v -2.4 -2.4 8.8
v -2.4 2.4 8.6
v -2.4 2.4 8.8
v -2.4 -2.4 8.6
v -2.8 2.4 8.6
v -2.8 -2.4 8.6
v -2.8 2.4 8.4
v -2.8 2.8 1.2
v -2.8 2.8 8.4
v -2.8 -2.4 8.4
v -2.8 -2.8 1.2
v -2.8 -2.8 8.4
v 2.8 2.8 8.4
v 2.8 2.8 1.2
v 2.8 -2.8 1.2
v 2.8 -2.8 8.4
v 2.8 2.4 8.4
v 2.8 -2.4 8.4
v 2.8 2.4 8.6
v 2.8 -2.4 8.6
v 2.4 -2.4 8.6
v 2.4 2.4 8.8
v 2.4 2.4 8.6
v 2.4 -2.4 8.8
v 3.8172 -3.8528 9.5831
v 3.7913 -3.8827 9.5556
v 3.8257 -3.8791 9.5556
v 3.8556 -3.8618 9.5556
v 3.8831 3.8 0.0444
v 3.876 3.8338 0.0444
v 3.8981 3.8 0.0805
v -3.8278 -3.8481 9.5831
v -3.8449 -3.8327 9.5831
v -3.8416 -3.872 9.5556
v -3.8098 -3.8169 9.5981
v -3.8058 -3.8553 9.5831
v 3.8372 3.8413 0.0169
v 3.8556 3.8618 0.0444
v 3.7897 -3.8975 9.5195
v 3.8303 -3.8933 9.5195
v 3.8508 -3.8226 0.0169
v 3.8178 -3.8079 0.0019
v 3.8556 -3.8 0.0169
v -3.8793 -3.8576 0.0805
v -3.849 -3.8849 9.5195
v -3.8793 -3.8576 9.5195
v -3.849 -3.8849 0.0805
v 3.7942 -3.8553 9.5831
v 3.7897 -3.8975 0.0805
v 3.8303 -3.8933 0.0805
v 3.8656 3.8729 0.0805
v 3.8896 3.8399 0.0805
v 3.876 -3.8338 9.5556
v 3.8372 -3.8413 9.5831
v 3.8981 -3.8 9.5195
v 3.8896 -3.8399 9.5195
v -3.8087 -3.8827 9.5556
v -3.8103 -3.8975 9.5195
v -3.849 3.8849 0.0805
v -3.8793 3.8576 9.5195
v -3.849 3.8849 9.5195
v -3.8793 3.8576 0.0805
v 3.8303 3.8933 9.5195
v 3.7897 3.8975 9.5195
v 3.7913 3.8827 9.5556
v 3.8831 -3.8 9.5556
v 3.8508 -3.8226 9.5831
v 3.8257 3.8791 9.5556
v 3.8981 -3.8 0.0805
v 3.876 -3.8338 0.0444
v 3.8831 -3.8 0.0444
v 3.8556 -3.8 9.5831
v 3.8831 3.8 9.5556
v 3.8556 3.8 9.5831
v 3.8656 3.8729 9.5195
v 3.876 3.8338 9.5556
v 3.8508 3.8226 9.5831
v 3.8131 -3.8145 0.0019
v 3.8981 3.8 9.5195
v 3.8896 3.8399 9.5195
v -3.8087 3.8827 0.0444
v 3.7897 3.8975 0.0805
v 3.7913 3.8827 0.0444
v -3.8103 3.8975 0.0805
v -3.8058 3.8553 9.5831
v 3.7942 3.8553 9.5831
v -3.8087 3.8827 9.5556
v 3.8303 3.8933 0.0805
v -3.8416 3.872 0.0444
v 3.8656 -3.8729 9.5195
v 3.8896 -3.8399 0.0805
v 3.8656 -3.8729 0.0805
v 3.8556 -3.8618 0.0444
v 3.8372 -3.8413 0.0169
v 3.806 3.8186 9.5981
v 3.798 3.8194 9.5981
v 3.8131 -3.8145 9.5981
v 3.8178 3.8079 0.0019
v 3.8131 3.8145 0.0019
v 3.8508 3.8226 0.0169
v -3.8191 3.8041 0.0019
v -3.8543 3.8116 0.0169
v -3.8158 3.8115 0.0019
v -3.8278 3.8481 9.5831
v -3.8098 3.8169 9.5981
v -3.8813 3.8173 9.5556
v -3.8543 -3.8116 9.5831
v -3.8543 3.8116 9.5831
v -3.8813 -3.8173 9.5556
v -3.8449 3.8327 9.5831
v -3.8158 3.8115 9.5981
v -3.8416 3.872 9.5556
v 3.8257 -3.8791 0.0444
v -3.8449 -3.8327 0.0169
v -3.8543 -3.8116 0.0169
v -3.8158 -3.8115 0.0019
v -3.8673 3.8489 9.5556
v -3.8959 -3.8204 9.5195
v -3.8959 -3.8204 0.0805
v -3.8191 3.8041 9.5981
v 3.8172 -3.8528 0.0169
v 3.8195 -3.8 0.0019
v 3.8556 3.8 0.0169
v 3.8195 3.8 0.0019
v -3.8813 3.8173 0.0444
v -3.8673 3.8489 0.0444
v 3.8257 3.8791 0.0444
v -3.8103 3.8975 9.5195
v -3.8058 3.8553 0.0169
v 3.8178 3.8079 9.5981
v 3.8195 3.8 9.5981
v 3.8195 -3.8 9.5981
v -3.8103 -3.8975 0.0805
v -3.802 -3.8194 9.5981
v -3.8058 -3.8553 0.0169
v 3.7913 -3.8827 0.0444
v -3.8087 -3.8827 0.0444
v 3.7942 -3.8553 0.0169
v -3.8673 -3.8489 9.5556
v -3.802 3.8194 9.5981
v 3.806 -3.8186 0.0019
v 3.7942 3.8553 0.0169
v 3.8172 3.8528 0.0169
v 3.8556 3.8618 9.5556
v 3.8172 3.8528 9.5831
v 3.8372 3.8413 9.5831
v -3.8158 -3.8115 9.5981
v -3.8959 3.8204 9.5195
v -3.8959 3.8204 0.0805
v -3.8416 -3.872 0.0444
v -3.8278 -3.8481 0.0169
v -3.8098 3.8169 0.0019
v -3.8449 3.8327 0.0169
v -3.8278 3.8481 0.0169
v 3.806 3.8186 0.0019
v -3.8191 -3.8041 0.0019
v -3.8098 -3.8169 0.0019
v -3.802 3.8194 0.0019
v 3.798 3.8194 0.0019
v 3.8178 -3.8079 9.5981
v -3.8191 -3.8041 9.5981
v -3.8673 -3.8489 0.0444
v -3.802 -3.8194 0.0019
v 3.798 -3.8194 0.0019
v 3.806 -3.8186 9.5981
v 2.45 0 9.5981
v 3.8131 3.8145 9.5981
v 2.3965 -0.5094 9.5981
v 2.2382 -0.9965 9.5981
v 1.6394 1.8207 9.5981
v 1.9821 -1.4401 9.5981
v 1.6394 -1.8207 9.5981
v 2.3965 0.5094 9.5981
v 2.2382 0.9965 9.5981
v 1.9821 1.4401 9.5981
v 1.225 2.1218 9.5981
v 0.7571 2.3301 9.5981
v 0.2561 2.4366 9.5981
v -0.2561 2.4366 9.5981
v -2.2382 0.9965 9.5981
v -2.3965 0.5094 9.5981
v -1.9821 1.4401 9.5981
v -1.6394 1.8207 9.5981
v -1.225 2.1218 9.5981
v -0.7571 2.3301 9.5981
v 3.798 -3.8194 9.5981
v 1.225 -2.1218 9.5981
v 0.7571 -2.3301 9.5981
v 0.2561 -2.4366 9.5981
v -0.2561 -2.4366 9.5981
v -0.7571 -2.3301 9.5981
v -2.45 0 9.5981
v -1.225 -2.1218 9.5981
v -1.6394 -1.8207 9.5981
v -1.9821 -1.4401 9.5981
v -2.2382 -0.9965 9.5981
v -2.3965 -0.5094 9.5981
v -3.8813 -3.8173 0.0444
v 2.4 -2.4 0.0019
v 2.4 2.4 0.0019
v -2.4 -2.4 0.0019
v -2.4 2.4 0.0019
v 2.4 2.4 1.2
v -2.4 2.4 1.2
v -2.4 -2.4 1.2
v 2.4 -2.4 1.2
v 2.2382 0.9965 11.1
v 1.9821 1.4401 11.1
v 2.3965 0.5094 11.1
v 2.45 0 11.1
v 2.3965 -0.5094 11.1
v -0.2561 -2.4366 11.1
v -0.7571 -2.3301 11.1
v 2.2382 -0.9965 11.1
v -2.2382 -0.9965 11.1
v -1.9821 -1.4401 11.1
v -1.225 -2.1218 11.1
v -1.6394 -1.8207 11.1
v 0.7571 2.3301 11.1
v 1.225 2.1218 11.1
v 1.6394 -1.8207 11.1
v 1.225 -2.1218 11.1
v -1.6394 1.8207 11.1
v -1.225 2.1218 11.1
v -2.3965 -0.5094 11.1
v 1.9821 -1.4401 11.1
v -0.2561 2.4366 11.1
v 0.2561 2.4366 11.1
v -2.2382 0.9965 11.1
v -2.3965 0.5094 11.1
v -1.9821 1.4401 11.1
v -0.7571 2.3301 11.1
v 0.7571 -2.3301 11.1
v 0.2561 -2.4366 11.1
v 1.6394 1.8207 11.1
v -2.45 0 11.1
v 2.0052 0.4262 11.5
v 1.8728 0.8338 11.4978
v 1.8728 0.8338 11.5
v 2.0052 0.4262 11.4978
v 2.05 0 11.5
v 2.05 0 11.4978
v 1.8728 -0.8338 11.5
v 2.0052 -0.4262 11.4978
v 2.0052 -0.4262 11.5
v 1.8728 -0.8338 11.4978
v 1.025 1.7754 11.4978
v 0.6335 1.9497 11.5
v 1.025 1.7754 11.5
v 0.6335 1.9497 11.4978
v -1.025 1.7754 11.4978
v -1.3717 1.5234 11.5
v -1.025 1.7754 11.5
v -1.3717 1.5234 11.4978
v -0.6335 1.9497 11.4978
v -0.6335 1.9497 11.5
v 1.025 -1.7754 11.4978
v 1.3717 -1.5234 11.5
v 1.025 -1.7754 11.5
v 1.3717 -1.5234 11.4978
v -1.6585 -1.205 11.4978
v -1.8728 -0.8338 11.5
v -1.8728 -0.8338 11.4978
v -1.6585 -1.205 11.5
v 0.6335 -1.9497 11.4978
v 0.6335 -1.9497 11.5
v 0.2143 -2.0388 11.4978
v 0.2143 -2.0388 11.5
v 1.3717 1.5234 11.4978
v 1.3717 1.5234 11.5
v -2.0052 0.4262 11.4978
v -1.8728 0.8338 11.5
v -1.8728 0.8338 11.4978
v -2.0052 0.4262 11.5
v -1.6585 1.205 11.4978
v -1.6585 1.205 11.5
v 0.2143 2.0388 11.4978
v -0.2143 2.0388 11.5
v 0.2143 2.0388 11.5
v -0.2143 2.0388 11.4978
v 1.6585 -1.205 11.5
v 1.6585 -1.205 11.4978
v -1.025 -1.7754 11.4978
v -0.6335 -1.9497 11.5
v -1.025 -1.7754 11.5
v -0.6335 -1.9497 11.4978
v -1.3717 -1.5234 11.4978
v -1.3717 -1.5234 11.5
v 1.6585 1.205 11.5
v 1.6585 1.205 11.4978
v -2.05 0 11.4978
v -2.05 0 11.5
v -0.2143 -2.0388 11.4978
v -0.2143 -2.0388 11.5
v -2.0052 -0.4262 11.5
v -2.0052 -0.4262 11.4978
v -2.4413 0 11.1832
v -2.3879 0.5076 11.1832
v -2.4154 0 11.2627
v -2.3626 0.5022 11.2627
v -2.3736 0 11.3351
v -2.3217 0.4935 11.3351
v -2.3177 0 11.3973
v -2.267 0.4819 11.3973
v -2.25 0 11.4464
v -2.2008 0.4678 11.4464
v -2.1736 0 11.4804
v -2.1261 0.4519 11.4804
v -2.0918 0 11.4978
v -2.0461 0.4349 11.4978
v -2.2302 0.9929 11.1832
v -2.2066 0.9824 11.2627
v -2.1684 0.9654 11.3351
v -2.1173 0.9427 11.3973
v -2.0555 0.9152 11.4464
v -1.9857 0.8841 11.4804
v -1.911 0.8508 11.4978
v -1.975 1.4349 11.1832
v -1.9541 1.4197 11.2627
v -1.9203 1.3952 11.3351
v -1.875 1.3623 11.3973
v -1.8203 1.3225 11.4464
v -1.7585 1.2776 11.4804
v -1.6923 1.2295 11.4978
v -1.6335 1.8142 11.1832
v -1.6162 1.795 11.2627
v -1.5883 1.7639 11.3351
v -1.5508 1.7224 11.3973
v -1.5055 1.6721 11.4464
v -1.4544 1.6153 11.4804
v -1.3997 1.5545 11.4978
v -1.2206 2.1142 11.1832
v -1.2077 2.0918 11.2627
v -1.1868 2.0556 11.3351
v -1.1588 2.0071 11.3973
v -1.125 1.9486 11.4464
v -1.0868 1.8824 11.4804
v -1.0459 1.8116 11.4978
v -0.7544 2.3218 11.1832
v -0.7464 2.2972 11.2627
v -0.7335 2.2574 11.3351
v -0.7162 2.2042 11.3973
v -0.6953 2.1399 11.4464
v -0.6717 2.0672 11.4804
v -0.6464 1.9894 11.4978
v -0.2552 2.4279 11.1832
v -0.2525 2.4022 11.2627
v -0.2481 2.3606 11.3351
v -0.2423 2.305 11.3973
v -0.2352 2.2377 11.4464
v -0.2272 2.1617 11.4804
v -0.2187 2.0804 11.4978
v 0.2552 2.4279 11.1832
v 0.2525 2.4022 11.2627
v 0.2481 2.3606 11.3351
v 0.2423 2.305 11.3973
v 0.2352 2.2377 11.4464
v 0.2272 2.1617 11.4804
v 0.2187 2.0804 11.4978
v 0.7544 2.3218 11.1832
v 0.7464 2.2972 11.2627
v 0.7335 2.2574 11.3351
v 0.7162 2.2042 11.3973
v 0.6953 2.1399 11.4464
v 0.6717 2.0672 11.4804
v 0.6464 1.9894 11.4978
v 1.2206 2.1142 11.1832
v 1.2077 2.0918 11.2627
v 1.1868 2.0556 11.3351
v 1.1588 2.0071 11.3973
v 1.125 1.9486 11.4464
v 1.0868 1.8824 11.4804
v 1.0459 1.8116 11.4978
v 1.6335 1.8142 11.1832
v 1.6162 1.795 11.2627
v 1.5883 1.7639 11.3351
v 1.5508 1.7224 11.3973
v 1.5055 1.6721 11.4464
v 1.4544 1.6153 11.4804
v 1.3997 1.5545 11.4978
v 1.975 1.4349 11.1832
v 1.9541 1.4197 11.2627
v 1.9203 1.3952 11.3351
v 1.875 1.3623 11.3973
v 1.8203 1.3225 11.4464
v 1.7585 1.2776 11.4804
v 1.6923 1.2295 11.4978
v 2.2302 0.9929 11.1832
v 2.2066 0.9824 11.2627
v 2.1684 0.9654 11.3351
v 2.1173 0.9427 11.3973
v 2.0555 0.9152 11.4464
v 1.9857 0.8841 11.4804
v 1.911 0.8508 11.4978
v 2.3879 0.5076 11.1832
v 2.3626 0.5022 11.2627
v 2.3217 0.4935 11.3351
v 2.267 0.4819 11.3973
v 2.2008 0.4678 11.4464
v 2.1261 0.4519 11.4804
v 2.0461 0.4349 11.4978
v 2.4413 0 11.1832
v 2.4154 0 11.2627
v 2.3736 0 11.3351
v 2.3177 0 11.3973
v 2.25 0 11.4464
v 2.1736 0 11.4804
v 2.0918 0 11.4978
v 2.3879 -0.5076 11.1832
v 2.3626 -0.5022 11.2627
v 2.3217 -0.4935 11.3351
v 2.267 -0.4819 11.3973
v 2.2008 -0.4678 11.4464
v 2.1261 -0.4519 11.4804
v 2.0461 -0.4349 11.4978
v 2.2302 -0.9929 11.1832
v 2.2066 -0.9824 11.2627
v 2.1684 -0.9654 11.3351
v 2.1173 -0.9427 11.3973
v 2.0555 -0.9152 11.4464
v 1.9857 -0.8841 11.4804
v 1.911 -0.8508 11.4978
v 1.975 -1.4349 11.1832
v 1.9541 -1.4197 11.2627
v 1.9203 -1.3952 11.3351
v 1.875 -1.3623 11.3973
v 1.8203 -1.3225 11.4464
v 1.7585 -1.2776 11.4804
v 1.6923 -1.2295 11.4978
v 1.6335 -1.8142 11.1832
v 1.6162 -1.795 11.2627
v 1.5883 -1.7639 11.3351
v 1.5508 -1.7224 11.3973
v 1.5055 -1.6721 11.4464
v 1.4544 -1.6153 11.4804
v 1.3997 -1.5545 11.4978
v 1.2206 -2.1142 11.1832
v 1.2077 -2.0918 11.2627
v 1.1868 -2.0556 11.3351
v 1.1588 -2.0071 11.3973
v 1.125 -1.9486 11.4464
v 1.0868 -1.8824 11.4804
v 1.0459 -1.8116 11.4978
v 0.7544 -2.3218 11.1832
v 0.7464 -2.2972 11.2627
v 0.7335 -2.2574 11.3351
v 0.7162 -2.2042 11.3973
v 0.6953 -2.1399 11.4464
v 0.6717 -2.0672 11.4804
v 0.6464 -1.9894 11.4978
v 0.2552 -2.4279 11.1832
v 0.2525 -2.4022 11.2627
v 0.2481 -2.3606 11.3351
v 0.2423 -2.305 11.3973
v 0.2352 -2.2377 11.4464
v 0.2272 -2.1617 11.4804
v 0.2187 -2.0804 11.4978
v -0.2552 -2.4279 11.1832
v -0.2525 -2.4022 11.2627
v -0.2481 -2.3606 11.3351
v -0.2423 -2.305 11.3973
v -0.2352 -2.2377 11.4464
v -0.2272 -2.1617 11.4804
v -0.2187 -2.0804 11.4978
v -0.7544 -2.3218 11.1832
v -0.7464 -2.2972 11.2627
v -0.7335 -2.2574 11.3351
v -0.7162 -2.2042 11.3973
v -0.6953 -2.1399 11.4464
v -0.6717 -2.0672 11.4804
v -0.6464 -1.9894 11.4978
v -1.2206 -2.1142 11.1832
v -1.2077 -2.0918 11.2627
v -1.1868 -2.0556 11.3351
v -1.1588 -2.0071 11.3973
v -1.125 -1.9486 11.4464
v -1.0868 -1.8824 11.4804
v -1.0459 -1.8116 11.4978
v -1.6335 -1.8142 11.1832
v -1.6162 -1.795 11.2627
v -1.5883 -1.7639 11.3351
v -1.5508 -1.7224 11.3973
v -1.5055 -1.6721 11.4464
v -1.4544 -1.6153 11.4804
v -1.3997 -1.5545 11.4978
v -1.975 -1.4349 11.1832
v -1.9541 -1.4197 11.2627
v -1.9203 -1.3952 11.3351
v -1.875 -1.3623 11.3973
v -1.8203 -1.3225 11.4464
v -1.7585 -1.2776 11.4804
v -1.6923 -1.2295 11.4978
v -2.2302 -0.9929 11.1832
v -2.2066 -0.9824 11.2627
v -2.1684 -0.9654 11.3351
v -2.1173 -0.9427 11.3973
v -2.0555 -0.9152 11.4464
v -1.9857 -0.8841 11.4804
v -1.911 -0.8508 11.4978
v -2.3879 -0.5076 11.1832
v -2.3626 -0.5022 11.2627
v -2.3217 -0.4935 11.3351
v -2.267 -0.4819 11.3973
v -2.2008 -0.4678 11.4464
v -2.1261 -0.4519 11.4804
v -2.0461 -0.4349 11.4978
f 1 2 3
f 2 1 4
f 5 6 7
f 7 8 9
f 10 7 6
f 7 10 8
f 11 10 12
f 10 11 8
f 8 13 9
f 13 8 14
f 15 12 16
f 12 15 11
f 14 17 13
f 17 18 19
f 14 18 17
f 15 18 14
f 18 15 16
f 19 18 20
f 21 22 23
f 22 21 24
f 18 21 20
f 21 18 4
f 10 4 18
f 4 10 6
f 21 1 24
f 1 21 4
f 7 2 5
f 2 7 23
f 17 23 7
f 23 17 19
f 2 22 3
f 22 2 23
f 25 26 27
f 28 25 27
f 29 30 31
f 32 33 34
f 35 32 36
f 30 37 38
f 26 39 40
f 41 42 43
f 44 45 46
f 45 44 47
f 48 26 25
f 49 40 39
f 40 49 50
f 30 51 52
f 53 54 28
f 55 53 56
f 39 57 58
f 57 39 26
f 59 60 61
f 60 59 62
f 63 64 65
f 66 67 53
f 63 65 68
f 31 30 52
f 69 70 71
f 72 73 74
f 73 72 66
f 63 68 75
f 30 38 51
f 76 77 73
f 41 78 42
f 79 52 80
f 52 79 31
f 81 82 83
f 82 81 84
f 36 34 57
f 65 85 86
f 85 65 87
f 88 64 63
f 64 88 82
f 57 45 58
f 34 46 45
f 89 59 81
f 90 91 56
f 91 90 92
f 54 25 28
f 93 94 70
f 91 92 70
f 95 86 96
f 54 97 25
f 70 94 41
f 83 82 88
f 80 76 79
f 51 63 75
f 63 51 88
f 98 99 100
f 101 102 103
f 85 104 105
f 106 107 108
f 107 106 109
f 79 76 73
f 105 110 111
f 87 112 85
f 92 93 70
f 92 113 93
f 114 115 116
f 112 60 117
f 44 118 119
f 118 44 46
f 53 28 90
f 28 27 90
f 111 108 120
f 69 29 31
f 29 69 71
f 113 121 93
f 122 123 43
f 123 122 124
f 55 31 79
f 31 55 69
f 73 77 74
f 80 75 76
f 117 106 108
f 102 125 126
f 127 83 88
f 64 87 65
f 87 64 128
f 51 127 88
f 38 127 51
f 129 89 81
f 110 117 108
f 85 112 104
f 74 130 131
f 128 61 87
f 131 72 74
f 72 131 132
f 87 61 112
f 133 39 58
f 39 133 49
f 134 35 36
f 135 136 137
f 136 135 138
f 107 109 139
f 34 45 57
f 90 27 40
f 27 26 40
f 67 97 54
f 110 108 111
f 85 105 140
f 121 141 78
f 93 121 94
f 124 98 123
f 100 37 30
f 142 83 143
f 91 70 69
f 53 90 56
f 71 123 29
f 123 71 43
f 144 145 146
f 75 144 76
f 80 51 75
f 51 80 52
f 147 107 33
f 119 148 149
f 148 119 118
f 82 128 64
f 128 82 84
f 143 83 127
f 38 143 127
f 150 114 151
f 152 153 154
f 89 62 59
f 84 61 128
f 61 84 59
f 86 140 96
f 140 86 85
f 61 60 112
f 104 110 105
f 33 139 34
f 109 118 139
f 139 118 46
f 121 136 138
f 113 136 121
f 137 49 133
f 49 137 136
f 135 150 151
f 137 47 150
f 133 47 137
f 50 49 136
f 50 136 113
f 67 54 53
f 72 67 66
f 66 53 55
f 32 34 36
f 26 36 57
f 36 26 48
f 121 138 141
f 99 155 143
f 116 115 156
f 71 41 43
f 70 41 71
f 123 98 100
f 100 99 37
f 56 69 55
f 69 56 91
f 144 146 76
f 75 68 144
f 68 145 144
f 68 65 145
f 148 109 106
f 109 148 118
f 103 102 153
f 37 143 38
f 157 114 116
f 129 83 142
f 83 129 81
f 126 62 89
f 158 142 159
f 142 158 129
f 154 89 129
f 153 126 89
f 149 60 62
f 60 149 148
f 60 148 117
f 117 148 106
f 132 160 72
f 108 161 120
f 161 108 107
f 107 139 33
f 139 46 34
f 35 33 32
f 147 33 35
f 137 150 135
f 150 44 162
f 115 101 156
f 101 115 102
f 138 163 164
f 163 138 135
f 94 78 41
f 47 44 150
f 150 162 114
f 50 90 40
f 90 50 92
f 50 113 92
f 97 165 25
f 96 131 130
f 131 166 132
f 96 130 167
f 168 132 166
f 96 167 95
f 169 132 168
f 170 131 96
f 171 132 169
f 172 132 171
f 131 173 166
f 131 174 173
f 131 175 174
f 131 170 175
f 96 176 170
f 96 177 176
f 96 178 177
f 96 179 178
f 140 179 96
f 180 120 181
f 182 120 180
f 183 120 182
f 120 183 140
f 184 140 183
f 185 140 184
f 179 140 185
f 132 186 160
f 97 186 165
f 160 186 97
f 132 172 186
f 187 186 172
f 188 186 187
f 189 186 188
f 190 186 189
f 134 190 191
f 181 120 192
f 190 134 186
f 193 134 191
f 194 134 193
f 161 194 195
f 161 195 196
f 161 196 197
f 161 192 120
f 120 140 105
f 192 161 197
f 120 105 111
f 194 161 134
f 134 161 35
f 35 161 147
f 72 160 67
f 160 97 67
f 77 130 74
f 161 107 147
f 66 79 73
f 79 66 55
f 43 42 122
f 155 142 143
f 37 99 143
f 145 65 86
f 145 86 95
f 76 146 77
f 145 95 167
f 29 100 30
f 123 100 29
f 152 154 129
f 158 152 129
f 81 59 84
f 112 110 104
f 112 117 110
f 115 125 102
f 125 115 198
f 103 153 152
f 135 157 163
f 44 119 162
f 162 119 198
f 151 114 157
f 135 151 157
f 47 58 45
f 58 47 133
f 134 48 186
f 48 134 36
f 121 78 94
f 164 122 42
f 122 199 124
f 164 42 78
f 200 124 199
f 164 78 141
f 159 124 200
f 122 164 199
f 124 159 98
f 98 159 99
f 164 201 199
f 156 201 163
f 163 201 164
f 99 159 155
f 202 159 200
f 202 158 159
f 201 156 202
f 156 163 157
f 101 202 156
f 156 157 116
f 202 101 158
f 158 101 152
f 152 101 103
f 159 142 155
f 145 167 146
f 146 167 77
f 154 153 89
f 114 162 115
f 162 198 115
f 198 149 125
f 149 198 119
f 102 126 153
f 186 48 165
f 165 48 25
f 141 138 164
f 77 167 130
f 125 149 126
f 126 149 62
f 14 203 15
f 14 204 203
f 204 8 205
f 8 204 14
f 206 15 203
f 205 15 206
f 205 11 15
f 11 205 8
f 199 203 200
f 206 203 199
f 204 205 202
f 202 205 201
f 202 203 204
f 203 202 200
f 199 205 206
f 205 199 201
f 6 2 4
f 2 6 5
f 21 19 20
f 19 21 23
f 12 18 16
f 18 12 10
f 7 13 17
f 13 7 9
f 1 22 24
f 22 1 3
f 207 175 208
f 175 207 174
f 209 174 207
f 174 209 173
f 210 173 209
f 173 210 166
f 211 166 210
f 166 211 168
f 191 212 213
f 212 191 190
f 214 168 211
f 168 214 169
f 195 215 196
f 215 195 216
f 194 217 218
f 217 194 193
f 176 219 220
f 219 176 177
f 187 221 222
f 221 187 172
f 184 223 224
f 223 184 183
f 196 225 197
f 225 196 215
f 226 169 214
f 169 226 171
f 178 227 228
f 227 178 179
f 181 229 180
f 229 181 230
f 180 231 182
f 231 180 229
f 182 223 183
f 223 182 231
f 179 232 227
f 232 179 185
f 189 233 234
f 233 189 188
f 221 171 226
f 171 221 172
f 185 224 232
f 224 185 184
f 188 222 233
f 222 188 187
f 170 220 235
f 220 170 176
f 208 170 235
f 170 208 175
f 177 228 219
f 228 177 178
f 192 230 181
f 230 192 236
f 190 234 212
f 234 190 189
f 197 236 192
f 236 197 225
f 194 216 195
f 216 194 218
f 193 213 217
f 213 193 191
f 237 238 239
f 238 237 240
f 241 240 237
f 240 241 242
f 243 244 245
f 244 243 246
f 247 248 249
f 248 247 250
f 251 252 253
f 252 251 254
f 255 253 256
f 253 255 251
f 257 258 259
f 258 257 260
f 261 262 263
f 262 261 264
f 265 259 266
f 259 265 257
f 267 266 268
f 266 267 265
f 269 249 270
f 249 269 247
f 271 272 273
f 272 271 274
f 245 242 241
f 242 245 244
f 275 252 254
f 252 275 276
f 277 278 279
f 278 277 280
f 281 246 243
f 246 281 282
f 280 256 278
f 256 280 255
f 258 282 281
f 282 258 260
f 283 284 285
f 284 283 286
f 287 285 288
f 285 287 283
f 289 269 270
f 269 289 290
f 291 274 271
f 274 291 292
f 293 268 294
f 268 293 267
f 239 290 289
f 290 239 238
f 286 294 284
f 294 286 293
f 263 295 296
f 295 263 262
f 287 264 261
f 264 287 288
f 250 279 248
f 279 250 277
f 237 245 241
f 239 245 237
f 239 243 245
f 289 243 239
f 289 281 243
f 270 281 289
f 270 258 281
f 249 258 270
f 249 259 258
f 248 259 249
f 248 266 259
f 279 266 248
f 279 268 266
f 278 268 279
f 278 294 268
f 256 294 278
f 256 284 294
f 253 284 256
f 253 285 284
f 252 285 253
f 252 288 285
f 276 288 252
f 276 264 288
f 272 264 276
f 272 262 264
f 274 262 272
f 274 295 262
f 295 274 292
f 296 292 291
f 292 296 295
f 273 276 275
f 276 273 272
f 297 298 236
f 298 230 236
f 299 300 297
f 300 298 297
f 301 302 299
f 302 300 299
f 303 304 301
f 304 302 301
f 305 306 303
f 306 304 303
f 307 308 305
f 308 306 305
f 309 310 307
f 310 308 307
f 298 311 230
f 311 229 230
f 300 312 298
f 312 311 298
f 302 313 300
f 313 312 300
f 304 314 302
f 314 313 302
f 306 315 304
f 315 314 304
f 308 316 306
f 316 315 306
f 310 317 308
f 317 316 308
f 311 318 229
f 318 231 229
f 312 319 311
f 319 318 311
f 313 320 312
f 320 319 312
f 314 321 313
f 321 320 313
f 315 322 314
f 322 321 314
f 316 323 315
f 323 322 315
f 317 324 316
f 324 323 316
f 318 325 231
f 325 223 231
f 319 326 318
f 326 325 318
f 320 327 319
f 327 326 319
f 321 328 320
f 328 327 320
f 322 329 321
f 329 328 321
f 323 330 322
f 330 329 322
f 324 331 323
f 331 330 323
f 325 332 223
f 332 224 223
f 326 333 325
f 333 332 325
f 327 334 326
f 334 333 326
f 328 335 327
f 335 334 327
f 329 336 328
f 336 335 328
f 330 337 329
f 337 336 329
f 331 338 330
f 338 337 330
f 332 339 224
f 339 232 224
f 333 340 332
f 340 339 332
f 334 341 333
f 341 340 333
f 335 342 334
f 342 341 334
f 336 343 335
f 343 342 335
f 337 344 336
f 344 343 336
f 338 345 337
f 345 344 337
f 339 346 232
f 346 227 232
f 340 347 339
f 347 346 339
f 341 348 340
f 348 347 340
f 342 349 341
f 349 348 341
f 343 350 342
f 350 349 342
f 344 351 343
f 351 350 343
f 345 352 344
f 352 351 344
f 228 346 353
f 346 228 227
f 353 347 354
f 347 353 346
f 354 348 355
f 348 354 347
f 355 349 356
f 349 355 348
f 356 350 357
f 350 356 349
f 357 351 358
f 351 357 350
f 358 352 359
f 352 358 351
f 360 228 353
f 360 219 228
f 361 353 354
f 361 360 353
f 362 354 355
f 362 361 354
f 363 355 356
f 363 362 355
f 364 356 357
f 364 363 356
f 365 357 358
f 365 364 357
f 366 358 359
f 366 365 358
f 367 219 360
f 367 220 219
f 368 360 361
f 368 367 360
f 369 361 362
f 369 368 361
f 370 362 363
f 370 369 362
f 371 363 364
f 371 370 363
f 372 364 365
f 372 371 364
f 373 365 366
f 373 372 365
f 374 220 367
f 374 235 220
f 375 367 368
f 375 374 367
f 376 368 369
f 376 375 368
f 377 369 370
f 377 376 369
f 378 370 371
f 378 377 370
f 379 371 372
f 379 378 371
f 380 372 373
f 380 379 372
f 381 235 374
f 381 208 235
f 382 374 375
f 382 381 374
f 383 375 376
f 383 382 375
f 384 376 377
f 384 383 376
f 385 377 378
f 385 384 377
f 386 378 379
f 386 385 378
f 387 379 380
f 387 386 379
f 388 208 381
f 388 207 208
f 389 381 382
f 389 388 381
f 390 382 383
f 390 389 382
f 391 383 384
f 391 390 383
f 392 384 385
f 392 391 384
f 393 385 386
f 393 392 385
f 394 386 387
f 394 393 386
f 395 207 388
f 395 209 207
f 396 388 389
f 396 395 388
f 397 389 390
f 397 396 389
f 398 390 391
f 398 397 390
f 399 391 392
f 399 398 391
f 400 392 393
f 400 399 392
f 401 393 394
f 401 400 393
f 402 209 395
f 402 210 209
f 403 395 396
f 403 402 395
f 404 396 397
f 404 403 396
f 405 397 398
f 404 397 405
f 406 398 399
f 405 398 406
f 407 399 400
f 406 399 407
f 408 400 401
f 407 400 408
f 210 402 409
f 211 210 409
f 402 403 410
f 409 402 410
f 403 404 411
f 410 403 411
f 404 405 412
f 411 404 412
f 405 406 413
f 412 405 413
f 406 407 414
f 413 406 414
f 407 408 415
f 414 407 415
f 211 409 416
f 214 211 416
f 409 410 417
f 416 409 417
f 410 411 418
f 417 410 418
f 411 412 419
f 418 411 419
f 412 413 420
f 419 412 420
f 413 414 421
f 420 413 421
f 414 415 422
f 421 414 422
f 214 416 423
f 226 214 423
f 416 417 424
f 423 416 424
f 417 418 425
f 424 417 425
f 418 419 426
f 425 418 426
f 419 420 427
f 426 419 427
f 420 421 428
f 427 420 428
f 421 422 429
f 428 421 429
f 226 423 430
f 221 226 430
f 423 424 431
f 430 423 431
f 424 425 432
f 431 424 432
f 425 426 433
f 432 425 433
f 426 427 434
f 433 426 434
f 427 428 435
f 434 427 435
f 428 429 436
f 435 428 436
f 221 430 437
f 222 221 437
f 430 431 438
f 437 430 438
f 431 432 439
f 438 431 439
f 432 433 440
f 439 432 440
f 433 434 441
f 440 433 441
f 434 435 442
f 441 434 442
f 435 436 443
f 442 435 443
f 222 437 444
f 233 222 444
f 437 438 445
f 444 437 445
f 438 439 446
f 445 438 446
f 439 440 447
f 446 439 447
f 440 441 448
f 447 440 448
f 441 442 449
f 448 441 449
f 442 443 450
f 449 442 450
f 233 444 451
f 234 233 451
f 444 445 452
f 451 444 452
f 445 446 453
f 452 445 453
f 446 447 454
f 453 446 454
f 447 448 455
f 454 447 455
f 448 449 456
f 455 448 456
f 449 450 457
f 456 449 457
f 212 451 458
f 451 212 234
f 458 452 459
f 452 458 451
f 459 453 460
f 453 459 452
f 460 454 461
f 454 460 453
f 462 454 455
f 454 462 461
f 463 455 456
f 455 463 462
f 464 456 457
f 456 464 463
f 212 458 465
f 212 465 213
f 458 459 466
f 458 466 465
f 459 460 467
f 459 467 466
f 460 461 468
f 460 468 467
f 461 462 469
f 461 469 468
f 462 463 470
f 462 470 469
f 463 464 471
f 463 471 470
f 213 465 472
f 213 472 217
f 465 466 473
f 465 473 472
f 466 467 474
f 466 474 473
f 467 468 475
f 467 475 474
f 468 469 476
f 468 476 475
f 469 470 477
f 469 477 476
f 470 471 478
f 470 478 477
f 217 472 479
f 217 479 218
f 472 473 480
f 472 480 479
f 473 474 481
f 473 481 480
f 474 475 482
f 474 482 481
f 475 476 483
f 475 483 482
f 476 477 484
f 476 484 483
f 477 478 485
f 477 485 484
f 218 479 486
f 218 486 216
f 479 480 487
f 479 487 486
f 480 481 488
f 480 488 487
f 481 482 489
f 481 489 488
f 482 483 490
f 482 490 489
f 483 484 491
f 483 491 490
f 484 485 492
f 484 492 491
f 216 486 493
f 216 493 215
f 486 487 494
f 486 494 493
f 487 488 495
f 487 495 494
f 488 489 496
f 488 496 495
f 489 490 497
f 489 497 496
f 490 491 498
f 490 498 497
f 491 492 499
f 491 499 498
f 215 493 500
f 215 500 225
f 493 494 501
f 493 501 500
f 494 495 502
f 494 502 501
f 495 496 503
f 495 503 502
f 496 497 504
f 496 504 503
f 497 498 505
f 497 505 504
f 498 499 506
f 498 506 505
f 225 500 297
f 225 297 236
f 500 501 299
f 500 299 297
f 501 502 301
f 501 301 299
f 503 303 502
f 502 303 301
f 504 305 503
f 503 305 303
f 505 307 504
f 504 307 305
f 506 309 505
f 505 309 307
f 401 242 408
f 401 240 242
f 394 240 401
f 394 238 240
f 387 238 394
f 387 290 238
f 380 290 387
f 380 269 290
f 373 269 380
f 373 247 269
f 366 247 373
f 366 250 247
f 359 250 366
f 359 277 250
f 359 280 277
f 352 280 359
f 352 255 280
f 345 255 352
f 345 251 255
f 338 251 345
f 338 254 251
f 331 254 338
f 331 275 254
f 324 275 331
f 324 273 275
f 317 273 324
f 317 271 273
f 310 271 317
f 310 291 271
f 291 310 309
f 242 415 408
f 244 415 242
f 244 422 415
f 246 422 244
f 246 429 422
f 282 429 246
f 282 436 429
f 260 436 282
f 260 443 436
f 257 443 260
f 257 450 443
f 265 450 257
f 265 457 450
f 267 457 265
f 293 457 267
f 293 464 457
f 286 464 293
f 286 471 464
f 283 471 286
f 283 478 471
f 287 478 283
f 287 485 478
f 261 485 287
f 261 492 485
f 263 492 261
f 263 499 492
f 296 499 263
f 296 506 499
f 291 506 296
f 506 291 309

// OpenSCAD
// file: ../../lib/roundedcube_simple.scad
/**
* Machine Blocks
* https://machinemania.net/blocks 
*
* Module for simple rounded cubes
* Copyright (c) 2022 Jan Philipp Knoeller <pk@pksoftware.de>
*
* Published under license:
* Creative Commons Attribution-NonCommercial-ShareAlike 4.0 International 
* https://creativecommons.org/licenses/by-nc-sa/4.0/
*
*/
module roundedcube_simple(size = [1, 1, 1], center = false, radius = 0.5, resolution = 20) {
	// If single value, convert to [x, y, z] vector
	size = (size[0] == undef) ? [size, size, size] : size;

	translate = (center == false) ?
		[radius, radius, radius] :
		[
			radius - (size[0] / 2),
			radius - (size[1] / 2),
			radius - (size[2] / 2)
	];

	translate(v = translate)
	minkowski() {
		cube(size = [
			size[0] - (radius * 2),
			size[1] - (radius * 2),
			size[2] - (radius * 2)
		]);
		sphere(r = radius, $fn = resolution);
	}
}
// file: ../../lib/roundedcube.scad
// More information: https://danielupshaw.com/openscad-rounded-corners/

// Set to 0.01 for higher definition curves (renders slower)
$fs = 0.15;

module roundedcube(size = [1, 1, 1], center = false, radius = 0.5, apply_to = "all", resolution = 20) {
	// If single value, convert to [x, y, z] vector
	size = (size[0] == undef) ? [size, size, size] : size;

	translate_min = radius;
	translate_xmax = size[0] - radius;
	translate_ymax = size[1] - radius;
	translate_zmax = size[2] - radius;

	diameter = radius * 2;

	obj_translate = (center == false) ?
		[0, 0, 0] : [
			-(size[0] / 2),
			-(size[1] / 2),
			-(size[2] / 2)
		];

	translate(v = obj_translate) {
		hull() {
			for (translate_x = [translate_min, translate_xmax]) {
				x_at = (translate_x == translate_min) ? "min" : "max";
				for (translate_y = [translate_min, translate_ymax]) {
					y_at = (translate_y == translate_min) ? "min" : "max";
					for (translate_z = [translate_min, translate_zmax]) {
						z_at = (translate_z == translate_min) ? "min" : "max";

						translate(v = [translate_x, translate_y, translate_z])
						if (
							(apply_to == "all") ||
							(apply_to == "xmin" && x_at == "min") || (apply_to == "xmax" && x_at == "max") ||
							(apply_to == "ymin" && y_at == "min") || (apply_to == "ymax" && y_at == "max") ||
							(apply_to == "zmin" && z_at == "min") || (apply_to == "zmax" && z_at == "max")
						) {
							sphere(r = radius, $fn = resolution);
						} else {
							rotate = 
								(apply_to == "xmin" || apply_to == "xmax" || apply_to == "x") ? [0, 90, 0] : (
								(apply_to == "ymin" || apply_to == "ymax" || apply_to == "y") ? [90, 90, 0] :
								[0, 0, 0]
							);
							rotate(a = rotate)
							cylinder(h = diameter, r = radius, center = true, $fn = resolution);
						}
					}
				}
			}
		}
	}
}
// main file
/**
* Machine Blocks
* https://machinemania.net/blocks 
*
* Plate 1x1
* Copyright (c) 2022 Jan Philipp Knoeller <pk@pksoftware.de>
*
* Published under license:
* Creative Commons Attribution-NonCommercial-ShareAlike 4.0 International 
* https://creativecommons.org/licenses/by-nc-sa/4.0/
*
*/
echo(version=version());

include <../../lib/block-v2.scad>;

color([0.376, 0.768, 0.058])
block(grid=[1,1], withKnobs=false, baseHeight=9.6);


block(grid=[1,1], baseHeight=9.4, knobHeight=2.1);
